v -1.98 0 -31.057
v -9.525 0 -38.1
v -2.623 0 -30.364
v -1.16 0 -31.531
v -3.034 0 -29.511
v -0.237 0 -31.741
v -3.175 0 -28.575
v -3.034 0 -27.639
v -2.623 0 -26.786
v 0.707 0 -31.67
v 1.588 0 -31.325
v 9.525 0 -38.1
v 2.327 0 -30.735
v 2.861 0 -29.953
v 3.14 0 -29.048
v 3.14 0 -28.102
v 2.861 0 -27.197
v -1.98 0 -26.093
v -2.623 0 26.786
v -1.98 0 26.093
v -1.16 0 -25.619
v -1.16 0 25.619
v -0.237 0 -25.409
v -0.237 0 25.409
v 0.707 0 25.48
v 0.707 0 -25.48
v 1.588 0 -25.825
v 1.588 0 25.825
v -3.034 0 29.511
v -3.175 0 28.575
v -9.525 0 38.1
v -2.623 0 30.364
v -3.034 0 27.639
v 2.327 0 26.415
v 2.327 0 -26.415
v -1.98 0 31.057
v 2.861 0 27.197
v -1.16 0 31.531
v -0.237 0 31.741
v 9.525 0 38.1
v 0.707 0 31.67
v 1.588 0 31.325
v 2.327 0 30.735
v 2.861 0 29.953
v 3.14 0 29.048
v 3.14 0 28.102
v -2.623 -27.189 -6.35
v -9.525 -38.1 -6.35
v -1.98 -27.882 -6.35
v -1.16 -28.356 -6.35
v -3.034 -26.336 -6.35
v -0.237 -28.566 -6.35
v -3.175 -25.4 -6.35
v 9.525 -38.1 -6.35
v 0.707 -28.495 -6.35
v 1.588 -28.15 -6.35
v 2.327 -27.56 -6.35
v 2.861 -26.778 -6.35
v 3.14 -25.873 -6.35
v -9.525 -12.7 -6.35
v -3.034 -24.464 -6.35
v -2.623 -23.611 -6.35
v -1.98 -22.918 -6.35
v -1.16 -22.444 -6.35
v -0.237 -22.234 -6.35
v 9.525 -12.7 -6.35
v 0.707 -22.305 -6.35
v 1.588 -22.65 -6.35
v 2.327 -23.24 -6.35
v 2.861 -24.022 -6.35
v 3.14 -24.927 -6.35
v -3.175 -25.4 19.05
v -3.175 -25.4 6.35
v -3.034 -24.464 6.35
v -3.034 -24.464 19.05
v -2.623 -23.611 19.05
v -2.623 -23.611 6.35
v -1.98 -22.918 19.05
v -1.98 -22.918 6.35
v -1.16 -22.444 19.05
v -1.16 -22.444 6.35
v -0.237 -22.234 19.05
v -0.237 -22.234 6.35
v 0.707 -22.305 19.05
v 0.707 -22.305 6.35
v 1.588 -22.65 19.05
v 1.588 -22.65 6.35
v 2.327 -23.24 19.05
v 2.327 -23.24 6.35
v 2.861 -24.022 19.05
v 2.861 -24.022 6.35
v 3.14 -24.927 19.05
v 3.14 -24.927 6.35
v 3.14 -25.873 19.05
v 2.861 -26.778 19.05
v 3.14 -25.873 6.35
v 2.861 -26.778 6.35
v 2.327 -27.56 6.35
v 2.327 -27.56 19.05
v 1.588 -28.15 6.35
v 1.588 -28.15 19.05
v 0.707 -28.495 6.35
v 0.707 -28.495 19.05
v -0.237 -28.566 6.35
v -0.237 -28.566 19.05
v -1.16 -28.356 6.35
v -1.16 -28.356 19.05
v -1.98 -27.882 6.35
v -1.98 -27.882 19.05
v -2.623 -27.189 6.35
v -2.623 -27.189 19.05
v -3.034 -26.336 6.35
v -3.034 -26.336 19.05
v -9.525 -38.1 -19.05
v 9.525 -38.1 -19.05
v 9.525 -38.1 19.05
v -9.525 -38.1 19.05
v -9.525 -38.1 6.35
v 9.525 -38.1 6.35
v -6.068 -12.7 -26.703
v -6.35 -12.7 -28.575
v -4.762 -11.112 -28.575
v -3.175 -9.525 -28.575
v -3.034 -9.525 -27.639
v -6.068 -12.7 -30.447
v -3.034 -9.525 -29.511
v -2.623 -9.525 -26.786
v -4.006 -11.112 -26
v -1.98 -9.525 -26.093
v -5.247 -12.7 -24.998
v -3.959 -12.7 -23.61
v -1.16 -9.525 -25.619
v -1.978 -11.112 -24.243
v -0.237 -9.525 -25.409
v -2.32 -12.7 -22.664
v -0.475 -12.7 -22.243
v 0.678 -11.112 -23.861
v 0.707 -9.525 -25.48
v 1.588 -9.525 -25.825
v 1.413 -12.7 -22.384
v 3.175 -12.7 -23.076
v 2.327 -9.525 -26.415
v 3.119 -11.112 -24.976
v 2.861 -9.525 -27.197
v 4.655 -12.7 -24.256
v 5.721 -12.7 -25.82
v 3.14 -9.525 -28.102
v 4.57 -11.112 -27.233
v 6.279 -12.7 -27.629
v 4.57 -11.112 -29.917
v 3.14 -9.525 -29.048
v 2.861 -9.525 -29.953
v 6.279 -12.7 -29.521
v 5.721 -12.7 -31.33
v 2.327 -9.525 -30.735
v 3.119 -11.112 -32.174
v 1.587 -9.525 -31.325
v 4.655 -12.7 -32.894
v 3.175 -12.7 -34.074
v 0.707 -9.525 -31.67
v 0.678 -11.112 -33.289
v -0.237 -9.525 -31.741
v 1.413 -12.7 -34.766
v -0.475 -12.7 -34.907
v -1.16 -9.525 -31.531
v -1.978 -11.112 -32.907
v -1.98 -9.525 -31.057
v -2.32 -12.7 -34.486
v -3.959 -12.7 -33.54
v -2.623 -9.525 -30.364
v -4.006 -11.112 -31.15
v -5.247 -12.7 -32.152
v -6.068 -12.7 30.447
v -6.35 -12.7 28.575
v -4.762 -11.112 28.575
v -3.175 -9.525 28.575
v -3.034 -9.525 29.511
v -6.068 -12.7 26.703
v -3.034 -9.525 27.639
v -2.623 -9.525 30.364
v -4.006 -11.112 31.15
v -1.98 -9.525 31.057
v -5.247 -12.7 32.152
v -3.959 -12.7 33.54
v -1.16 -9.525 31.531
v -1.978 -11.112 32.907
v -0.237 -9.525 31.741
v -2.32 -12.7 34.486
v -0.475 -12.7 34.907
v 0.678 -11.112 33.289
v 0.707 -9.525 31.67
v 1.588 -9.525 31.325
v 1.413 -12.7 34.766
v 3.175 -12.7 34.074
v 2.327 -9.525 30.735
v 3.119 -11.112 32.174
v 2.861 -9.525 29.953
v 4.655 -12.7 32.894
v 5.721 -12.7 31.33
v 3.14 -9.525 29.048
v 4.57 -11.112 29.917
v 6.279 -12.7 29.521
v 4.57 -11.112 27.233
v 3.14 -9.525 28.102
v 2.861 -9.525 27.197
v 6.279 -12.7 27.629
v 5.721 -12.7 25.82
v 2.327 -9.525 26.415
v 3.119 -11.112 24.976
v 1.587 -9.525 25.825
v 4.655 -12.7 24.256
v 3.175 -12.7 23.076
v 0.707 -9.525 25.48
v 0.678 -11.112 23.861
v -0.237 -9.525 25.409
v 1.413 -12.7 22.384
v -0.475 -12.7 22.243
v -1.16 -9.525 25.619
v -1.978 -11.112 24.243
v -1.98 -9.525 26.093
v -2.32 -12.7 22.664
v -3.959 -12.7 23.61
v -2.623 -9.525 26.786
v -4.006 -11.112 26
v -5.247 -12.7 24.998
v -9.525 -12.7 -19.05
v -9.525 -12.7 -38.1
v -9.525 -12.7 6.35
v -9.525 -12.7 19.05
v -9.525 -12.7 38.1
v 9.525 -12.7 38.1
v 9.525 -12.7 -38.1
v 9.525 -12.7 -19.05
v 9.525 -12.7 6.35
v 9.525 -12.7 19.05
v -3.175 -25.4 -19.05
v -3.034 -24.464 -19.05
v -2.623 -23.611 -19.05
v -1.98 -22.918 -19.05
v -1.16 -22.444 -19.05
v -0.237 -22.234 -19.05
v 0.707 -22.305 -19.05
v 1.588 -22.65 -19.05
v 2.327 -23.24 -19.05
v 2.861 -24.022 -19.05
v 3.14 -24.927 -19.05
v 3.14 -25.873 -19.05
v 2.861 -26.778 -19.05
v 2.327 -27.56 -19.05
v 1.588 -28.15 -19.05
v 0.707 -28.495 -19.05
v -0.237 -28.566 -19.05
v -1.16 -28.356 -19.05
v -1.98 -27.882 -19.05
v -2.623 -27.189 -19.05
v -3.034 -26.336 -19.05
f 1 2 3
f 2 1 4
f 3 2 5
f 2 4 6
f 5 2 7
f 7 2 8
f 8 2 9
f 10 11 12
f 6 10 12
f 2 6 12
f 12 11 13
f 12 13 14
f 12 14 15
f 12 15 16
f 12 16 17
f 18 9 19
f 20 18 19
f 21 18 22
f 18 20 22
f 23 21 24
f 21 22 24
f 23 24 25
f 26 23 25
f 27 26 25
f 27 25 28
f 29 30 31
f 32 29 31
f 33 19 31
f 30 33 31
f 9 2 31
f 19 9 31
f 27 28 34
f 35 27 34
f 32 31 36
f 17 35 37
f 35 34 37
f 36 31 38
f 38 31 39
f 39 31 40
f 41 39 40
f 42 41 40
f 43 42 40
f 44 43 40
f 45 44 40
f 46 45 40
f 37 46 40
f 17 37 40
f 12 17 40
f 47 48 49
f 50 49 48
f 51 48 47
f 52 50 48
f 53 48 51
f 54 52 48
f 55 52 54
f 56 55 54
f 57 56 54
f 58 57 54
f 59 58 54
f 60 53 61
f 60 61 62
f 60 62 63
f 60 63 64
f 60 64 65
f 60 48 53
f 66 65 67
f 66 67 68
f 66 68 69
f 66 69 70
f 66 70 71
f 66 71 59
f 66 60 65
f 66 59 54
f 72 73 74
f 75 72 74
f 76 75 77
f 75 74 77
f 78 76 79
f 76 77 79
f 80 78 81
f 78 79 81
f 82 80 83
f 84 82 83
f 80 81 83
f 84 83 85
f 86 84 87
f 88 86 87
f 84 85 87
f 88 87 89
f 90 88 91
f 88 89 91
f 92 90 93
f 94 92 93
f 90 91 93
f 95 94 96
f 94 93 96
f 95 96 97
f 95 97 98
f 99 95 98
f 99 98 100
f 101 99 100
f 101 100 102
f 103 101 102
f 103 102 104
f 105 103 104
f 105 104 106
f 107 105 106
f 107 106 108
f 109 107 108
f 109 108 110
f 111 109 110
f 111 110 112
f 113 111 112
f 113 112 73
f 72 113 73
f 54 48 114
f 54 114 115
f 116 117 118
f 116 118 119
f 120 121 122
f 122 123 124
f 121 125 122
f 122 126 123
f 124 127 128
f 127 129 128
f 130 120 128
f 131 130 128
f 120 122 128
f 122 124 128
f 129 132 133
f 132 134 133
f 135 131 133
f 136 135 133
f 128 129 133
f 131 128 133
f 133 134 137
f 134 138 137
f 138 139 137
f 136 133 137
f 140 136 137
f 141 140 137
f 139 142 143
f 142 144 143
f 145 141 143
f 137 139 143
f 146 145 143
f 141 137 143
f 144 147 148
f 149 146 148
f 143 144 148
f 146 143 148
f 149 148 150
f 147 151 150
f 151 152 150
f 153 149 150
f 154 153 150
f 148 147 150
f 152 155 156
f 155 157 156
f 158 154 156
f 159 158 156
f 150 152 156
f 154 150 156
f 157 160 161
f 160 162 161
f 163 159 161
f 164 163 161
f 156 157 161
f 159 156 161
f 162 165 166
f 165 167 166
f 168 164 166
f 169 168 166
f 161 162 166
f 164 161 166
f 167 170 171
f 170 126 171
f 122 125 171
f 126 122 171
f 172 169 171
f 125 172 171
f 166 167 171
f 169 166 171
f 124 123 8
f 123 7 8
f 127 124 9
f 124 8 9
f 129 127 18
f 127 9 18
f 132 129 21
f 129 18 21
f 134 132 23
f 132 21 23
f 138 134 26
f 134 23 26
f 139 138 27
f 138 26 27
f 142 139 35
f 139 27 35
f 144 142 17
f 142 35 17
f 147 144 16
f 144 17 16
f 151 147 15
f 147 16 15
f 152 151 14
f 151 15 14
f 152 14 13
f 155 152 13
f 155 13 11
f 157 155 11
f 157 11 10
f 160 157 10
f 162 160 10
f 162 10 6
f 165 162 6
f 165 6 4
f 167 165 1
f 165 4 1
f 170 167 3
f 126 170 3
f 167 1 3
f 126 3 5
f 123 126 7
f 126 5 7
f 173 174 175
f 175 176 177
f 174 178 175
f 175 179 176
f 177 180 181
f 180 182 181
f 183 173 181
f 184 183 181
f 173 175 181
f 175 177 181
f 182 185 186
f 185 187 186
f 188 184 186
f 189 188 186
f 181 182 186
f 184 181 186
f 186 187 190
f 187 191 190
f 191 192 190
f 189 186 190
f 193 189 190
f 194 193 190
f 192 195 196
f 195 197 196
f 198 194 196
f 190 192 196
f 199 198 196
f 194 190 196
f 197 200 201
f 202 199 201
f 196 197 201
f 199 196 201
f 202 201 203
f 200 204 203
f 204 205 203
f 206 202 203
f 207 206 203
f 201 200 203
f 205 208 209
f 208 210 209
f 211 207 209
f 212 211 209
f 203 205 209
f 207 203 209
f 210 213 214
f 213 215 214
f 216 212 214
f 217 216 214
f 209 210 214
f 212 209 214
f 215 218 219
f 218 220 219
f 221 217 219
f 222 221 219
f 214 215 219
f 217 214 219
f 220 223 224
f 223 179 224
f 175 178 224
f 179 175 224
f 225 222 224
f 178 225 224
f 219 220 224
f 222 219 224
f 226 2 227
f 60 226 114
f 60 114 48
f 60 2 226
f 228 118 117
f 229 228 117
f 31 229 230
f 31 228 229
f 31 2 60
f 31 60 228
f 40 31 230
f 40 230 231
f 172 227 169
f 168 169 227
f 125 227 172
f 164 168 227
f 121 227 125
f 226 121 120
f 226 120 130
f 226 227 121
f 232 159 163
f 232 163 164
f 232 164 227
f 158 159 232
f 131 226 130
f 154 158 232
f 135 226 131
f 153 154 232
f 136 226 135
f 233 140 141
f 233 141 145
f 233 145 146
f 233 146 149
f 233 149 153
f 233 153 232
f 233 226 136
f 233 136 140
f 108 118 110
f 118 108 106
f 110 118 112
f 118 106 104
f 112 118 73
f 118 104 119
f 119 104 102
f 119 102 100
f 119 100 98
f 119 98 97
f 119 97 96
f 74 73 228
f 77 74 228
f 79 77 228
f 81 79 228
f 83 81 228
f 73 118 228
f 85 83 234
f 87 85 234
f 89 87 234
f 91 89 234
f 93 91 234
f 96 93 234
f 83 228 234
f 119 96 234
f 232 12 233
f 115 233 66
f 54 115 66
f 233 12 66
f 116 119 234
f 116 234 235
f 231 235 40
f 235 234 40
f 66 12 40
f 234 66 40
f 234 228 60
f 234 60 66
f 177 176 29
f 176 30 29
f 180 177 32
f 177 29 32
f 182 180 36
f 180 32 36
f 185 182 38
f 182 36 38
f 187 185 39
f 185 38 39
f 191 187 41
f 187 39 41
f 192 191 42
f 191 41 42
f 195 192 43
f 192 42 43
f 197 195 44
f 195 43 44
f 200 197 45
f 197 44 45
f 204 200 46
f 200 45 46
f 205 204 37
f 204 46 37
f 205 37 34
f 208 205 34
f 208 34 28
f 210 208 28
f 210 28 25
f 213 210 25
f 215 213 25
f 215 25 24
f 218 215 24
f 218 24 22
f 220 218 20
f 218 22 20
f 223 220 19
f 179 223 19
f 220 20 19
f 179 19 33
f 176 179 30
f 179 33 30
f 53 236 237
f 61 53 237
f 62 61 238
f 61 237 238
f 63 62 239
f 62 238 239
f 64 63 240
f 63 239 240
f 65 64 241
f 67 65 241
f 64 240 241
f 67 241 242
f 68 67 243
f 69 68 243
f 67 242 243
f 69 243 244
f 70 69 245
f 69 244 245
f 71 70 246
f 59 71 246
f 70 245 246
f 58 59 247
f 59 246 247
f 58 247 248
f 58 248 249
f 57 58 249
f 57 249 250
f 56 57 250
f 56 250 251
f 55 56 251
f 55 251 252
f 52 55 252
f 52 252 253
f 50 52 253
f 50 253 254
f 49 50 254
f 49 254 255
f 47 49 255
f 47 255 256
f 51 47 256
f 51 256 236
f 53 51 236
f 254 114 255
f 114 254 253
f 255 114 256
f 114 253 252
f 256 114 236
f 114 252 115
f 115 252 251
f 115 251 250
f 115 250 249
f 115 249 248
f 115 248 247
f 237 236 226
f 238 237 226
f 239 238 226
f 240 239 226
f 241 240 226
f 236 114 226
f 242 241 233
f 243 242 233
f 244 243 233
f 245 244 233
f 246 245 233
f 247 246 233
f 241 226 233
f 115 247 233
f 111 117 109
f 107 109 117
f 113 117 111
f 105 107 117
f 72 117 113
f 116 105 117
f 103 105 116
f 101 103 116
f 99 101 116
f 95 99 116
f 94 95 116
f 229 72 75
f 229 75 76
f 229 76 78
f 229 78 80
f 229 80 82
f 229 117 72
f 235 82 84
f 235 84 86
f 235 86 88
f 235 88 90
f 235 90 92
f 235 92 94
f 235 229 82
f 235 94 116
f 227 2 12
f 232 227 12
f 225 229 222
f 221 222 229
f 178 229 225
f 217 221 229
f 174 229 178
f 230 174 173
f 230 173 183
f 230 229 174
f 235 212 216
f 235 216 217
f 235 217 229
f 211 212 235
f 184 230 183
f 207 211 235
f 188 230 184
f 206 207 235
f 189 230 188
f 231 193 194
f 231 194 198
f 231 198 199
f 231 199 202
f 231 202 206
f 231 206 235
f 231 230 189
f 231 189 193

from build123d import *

# Parameters (mm, degrees)
F0_W           = 19.05
F0_H           = 76.2
F1_DEPTH       = 12.7
F2_W           = 19.05
F2_H           = 12.7
F3_DEPTH       = 25.4
F5_D           = 6.35
F7_D           = 6.35
F7_CSINK_D     = 12.7
F7_CSINK_ANGLE = 90


with BuildPart() as f1:
    # F0 (on Front) → F1 (new body)
    with BuildSketch(Plane.XZ):
        Rectangle(F0_W, F0_H)
    extrude(amount=F1_DEPTH)

    # F2 (on face) → F3 (join)
    with BuildSketch(Plane.XZ.offset(12.7)):
        with Locations((0, -12.7)):
            Rectangle(F2_W, F2_H)
        with Locations((0, 12.7)):
            Rectangle(F2_W, F2_H)
    extrude(amount=F3_DEPTH)

    # F5 (through all)
    with Locations(Plane.XY.offset(19.05)):
        with Locations((0, -25.4)):
            Hole(F5_D / 2)

    # F7 (through all)
    with Locations(Plane.XZ.offset(12.7)):
        with Locations((0, 28.575), (0, -28.575)):
            CounterSinkHole(F7_D / 2, F7_CSINK_D / 2, counter_sink_angle=F7_CSINK_ANGLE)


solid = f1.part
